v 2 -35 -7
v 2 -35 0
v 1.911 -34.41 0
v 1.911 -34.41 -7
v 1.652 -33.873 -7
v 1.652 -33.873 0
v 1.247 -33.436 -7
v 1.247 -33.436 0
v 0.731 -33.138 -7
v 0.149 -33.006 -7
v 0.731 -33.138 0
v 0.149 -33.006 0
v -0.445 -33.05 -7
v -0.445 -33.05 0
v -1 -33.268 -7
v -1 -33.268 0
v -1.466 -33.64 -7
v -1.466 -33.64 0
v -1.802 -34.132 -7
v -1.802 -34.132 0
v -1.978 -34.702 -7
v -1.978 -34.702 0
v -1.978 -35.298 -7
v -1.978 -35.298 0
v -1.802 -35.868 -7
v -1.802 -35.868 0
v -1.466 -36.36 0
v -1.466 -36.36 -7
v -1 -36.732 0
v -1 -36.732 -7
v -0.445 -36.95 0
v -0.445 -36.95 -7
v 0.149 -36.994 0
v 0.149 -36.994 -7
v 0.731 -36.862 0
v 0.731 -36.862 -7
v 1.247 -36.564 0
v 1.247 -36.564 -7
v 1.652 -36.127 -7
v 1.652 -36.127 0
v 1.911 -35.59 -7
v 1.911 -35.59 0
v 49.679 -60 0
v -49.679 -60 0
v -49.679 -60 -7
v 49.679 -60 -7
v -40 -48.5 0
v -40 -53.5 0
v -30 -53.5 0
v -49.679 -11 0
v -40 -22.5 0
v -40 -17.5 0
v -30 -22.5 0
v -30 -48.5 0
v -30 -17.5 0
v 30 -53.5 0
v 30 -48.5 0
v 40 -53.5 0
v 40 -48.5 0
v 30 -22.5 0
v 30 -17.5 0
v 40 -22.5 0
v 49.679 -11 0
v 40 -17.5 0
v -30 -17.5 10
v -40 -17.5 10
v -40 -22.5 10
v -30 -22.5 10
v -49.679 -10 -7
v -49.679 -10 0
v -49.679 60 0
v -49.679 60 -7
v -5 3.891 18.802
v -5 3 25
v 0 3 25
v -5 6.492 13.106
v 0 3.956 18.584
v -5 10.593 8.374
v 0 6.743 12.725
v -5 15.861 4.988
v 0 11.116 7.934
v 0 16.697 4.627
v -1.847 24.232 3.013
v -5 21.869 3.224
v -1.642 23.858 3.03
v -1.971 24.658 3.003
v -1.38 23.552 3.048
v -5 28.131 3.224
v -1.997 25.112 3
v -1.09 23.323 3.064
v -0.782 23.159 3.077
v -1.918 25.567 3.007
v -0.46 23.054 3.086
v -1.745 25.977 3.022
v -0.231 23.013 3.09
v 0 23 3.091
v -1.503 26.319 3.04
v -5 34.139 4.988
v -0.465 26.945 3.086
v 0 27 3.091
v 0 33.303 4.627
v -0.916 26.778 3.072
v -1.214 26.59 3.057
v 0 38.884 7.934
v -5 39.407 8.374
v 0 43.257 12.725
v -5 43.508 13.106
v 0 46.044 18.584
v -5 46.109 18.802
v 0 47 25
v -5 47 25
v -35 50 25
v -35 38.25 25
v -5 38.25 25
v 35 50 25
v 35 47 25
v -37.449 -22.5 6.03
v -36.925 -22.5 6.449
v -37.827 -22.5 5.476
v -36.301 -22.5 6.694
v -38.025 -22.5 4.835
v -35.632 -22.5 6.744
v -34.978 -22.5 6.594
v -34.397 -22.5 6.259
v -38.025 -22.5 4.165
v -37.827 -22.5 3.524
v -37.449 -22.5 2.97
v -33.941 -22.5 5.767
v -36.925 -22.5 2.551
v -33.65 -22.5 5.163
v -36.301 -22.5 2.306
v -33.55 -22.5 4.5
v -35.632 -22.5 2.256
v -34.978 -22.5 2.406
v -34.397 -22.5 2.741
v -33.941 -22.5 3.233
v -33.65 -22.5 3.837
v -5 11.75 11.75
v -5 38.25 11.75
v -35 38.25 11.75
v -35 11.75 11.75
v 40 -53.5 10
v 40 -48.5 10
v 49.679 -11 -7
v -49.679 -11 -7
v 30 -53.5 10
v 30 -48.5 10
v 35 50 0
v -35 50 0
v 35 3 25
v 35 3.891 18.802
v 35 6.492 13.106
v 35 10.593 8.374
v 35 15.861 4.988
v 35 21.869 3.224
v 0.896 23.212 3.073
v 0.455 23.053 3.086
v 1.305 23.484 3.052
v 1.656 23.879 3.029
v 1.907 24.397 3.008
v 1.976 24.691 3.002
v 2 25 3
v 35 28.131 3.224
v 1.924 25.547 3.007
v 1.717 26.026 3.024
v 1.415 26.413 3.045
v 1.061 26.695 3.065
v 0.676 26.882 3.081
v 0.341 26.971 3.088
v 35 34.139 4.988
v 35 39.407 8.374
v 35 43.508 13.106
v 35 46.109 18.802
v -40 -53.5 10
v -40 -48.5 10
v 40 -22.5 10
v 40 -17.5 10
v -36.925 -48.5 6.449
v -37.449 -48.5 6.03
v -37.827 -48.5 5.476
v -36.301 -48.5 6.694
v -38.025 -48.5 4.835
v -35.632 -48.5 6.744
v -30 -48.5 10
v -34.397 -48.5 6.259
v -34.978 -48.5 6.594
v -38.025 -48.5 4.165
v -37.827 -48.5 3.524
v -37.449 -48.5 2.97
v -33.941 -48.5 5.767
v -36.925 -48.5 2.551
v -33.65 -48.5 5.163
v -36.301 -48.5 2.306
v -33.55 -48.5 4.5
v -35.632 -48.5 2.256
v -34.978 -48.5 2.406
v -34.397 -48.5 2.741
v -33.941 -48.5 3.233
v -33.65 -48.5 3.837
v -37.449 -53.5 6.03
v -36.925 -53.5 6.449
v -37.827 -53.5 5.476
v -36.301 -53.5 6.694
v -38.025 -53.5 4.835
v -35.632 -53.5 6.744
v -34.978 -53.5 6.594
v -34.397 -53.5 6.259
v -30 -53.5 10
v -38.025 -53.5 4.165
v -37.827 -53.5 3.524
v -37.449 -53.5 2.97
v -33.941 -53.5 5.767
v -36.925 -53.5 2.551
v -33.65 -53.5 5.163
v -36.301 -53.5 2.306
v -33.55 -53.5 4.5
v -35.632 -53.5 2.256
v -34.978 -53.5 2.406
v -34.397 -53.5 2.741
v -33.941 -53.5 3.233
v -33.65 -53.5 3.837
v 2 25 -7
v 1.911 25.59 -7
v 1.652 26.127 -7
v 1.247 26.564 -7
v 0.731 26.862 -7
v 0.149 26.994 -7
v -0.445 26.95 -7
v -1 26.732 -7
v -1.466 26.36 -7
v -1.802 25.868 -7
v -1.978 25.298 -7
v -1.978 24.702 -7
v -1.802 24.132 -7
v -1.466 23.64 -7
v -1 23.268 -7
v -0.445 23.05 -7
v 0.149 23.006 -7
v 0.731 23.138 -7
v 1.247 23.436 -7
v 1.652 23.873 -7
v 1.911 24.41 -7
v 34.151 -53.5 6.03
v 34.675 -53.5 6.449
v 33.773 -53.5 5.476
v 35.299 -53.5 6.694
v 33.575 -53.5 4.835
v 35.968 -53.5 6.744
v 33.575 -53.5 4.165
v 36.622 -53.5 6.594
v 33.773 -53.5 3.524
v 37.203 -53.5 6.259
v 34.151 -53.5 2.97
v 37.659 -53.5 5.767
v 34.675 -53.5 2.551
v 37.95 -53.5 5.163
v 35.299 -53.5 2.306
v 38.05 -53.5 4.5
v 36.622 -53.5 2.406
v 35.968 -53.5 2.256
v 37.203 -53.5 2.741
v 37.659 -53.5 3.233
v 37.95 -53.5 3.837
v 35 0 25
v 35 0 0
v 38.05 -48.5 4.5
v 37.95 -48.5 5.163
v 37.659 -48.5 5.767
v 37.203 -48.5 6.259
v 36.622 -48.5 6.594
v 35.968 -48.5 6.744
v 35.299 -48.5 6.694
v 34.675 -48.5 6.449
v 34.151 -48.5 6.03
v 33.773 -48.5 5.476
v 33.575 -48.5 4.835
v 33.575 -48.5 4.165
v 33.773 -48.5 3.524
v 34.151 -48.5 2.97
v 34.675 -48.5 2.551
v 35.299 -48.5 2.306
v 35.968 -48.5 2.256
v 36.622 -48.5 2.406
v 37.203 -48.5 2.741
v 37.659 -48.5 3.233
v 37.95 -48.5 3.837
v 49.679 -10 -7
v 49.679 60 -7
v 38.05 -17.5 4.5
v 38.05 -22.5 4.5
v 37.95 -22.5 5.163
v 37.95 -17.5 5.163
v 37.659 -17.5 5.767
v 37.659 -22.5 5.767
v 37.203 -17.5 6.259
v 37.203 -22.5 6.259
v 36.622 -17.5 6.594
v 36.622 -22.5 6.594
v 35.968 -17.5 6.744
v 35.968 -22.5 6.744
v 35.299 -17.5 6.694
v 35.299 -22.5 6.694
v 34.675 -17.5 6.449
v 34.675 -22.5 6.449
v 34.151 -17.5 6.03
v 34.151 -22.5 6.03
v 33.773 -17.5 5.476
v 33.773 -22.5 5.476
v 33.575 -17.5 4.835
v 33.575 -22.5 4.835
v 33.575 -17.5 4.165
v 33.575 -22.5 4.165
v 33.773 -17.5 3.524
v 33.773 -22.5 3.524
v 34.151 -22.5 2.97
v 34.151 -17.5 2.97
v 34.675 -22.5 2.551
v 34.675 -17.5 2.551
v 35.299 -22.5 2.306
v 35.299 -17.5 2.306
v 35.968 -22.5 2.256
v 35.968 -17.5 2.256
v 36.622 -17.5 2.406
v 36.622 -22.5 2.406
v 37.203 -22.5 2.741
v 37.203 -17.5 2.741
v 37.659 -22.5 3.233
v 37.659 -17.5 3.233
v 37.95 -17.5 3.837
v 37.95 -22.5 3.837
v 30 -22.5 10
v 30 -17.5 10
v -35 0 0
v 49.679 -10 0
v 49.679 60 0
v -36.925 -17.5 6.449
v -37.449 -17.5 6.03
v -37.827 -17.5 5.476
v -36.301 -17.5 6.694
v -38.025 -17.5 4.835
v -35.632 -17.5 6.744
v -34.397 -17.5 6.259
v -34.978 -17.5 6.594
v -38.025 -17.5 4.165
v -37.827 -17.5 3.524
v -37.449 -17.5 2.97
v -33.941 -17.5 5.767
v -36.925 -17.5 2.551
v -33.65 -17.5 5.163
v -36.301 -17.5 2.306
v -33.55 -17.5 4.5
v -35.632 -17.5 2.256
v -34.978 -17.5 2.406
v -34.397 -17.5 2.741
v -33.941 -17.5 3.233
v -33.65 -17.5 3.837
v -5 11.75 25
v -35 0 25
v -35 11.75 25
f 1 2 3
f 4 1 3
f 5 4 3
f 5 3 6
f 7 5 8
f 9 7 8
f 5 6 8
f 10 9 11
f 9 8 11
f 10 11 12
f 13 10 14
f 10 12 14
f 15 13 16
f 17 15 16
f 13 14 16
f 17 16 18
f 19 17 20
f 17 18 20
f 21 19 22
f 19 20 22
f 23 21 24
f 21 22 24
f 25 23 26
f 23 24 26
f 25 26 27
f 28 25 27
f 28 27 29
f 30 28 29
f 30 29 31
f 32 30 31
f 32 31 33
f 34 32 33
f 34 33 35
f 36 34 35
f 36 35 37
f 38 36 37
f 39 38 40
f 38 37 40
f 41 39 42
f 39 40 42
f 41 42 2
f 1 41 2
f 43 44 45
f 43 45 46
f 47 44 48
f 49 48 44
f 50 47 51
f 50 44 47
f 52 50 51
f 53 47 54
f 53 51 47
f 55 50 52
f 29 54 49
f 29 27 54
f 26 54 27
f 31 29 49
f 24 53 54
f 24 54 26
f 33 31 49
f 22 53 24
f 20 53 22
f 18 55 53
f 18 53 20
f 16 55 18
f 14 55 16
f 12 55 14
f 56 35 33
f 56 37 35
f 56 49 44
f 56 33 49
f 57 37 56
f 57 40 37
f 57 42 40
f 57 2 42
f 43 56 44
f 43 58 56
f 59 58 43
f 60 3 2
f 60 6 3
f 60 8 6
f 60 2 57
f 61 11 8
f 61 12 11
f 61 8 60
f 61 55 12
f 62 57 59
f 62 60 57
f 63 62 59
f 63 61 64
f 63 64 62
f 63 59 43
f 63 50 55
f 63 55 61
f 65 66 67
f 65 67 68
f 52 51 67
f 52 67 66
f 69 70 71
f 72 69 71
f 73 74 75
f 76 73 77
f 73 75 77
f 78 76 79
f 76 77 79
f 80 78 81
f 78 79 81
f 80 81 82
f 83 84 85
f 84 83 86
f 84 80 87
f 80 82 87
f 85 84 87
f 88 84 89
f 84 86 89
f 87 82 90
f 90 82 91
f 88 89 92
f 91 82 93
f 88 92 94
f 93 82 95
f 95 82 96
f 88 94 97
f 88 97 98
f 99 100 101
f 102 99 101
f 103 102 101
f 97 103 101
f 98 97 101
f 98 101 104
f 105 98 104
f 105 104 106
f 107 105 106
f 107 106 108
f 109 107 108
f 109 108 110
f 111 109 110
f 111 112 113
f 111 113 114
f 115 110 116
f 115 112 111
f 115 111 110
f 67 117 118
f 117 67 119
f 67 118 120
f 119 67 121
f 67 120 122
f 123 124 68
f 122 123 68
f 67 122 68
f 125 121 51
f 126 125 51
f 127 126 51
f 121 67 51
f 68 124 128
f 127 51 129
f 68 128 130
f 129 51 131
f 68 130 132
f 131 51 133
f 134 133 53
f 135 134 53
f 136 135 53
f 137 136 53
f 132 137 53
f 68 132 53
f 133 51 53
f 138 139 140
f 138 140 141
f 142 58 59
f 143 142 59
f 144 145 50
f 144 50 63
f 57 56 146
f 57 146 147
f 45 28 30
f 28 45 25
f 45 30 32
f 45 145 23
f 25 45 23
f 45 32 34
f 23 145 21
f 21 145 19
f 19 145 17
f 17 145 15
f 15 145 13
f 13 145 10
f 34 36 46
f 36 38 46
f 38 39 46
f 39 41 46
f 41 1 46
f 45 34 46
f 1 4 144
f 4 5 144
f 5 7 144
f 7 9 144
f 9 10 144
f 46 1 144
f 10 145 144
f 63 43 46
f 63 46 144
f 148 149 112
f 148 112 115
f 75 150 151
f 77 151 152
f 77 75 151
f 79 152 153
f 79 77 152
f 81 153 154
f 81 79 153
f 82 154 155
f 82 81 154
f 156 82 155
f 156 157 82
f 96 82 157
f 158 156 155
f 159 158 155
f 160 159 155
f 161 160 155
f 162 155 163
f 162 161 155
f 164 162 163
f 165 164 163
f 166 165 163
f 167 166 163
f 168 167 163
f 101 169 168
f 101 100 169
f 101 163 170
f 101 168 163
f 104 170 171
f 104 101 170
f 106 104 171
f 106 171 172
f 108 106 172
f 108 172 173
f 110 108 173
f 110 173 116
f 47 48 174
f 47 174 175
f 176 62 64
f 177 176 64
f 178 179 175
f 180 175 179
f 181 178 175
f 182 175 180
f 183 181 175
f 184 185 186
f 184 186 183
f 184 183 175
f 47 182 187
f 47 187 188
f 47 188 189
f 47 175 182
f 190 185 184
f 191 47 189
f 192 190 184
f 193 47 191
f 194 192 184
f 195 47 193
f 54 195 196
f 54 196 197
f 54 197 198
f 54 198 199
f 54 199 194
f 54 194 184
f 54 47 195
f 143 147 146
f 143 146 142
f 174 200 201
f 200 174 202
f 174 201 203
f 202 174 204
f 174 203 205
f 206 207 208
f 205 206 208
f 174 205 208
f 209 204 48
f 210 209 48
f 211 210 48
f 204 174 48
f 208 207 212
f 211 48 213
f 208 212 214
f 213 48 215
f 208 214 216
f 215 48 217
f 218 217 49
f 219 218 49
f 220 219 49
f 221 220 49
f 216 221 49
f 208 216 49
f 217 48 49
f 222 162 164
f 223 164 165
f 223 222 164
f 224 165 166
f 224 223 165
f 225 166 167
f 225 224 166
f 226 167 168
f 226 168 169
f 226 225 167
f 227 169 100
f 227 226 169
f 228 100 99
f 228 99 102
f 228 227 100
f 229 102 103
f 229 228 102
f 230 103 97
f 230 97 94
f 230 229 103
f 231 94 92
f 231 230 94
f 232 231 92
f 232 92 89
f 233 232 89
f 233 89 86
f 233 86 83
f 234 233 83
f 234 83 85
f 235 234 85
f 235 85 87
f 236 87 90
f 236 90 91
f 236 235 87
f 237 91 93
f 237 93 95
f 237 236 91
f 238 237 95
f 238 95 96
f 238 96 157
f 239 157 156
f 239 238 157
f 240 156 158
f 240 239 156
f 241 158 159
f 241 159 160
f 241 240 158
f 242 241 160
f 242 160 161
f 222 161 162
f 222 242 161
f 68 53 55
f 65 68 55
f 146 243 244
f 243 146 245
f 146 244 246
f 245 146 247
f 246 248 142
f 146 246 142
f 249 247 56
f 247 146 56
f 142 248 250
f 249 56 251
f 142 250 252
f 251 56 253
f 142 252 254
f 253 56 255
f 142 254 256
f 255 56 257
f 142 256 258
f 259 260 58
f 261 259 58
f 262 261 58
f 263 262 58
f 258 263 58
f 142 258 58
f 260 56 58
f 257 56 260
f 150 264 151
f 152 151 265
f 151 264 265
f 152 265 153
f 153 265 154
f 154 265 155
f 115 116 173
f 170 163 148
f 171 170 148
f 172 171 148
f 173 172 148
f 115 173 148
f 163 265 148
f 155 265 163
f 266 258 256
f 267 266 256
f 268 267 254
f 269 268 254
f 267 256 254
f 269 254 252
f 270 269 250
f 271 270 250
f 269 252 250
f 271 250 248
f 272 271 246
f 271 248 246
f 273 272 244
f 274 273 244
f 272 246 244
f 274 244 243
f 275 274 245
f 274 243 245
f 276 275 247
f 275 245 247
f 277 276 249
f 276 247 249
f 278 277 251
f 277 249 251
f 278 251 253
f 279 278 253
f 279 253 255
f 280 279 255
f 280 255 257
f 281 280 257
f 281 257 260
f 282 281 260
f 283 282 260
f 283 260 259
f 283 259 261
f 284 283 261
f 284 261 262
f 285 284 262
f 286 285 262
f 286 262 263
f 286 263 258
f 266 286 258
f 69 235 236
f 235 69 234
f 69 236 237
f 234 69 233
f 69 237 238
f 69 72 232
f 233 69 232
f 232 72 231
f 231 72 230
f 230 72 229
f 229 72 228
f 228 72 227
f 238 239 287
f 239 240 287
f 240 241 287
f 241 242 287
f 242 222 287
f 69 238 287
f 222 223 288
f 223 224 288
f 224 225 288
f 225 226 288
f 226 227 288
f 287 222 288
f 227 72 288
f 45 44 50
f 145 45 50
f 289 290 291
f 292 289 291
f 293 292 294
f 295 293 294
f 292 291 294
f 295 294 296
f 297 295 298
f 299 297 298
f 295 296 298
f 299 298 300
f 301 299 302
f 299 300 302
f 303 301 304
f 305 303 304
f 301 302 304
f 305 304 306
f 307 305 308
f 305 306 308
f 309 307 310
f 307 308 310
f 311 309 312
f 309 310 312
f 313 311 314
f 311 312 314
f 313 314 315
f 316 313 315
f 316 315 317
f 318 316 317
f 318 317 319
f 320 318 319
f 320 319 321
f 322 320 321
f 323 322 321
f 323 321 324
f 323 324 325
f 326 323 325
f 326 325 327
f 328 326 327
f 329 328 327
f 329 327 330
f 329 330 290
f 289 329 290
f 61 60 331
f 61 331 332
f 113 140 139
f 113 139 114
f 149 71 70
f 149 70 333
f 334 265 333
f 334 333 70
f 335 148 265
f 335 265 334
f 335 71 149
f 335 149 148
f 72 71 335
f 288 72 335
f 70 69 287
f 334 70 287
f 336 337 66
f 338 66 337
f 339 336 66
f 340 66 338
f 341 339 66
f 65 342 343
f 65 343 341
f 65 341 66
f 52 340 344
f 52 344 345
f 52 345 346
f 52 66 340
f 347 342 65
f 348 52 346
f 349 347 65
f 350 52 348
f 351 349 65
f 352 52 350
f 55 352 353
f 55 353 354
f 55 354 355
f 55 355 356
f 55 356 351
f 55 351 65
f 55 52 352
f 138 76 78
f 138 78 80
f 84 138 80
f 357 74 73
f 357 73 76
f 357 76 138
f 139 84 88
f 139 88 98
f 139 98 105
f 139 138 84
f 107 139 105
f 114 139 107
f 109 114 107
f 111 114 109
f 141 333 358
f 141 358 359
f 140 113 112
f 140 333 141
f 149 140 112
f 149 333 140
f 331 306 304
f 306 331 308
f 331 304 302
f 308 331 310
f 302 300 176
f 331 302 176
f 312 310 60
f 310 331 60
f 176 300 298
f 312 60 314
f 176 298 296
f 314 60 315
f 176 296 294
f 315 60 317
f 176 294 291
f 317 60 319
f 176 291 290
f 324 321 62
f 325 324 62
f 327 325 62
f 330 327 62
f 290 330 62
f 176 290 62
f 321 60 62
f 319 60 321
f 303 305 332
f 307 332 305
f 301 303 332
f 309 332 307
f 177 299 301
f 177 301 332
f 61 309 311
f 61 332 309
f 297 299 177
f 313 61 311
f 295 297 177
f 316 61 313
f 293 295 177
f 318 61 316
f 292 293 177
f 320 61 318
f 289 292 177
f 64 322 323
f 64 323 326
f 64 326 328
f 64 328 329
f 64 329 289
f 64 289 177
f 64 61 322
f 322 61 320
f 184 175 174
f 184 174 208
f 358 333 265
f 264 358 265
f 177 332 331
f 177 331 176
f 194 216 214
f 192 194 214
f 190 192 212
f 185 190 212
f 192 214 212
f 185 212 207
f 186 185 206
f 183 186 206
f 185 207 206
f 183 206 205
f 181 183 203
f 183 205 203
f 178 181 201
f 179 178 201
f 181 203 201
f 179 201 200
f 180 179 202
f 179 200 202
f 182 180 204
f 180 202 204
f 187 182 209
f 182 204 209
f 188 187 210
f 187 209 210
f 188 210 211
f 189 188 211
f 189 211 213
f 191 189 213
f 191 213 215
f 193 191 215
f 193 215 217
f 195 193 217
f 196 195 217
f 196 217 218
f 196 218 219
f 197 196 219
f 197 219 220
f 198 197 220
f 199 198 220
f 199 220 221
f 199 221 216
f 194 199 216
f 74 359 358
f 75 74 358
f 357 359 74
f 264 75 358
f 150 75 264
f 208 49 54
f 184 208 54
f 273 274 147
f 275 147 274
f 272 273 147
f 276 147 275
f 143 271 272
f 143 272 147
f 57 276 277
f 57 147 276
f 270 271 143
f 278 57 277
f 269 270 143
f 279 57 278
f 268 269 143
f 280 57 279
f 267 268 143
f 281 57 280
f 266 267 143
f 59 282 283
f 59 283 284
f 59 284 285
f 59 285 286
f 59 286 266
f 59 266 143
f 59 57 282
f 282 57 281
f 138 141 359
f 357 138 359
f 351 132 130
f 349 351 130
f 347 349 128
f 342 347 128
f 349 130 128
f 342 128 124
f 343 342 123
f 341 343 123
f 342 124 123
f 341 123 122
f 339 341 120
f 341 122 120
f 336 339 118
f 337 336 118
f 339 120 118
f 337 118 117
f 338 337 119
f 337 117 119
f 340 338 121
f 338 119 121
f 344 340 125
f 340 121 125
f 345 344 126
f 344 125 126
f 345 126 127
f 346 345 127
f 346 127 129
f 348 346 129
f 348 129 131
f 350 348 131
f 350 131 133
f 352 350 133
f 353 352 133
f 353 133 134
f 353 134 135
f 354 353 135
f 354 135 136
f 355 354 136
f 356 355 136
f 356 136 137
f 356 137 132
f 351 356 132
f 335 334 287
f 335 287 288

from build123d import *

# Parameters (mm, degrees)
F0_W          = 99.3576076057
F0_H          = 120
F0_R          = 2
F1_DEPTH      = 7
F2_W          = 70
F2_H          = 50
F2_R          = 2
F3_DEPTH      = 25
F2_W_2        = 10
F2_H_2        = 5
F4_DEPTH      = 10
F5_R          = 22
F6_DEPTH      = 35
F6_DEPTH_BACK = 5
F7_W          = 26.5
F7_H          = 26.5
F8_DEPTH      = 30
F9_R          = 2.25
F10_DEPTH     = 40
F11_W         = 99.3576076057
F11_H         = 1
F12_DEPTH     = 25


# Not quite as in the source:
# - a feature names something its author has since deleted; it is built from what else it names


with BuildPart() as f1:
    # F0 (on Top) → F1 (new body)
    with BuildSketch(Plane.XY):
        Rectangle(F0_W, F0_H)
        with Locations((0, -35)):
            Circle(F0_R, mode=Mode.SUBTRACT)
        with Locations((0, 25)):
            Circle(F0_R, mode=Mode.SUBTRACT)
    extrude(amount=-F1_DEPTH)

    # F2 (on face) → F3 (join)
    with BuildSketch(Plane.XY):
        with Locations((0, 25)):
            Rectangle(F2_W, F2_H)
        with Locations((0, 25)):
            Circle(F2_R, mode=Mode.SUBTRACT)
    extrude(amount=F3_DEPTH)

    # F2 (on face) → F4 (join)
    with BuildSketch(Plane.XY):
        with Locations((0, 25)):
            Rectangle(F2_W, F2_H)
        with Locations((0, 25)):
            Circle(F2_R, mode=Mode.SUBTRACT)
        with Locations((-35, -20)):
            Rectangle(F2_W_2, F2_H_2)
        with Locations((35, -51)):
            Rectangle(F2_W_2, F2_H_2)
        with Locations((-35, -51)):
            Rectangle(F2_W_2, F2_H_2)
        with Locations((35, -20)):
            Rectangle(F2_W_2, F2_H_2)
    extrude(amount=F4_DEPTH)

    # F5 (on Right) → F6 (cut, two sides)
    with BuildSketch(Plane.YZ) as f6_sk:
        with Locations((25, 25)):
            Circle(F5_R)
    extrude(amount=F6_DEPTH, mode=Mode.SUBTRACT)
    extrude(f6_sk.sketch, amount=-F6_DEPTH_BACK, mode=Mode.SUBTRACT)

    # F7 (on face) → F8 (cut)
    with BuildSketch(Plane(origin=(-35, 0, 0), x_dir=(0, -1, 0), z_dir=(-1, 0, 0))):
        with Locations((-25, 25)):
            Rectangle(F7_W, F7_H)
    extrude(amount=-F8_DEPTH, mode=Mode.SUBTRACT)

    # F9 (on face) → F10 (cut)
    with BuildSketch(Plane.XZ.offset(53.5)):
        with Locations((35.8, 4.5)):
            Circle(F9_R)
        with Locations((-35.8, 4.5)):
            Circle(F9_R)
    extrude(amount=-F10_DEPTH, mode=Mode.SUBTRACT)

    # F11 (on face) → F12 (cut)
    with BuildSketch(Plane(origin=(0, 0, -7), x_dir=(1, 0, 0), z_dir=(0, 0, -1))):
        with Locations((0, 10.5)):
            Rectangle(F11_W, F11_H)
    extrude(amount=-F12_DEPTH, mode=Mode.SUBTRACT)


solid = f1.part
